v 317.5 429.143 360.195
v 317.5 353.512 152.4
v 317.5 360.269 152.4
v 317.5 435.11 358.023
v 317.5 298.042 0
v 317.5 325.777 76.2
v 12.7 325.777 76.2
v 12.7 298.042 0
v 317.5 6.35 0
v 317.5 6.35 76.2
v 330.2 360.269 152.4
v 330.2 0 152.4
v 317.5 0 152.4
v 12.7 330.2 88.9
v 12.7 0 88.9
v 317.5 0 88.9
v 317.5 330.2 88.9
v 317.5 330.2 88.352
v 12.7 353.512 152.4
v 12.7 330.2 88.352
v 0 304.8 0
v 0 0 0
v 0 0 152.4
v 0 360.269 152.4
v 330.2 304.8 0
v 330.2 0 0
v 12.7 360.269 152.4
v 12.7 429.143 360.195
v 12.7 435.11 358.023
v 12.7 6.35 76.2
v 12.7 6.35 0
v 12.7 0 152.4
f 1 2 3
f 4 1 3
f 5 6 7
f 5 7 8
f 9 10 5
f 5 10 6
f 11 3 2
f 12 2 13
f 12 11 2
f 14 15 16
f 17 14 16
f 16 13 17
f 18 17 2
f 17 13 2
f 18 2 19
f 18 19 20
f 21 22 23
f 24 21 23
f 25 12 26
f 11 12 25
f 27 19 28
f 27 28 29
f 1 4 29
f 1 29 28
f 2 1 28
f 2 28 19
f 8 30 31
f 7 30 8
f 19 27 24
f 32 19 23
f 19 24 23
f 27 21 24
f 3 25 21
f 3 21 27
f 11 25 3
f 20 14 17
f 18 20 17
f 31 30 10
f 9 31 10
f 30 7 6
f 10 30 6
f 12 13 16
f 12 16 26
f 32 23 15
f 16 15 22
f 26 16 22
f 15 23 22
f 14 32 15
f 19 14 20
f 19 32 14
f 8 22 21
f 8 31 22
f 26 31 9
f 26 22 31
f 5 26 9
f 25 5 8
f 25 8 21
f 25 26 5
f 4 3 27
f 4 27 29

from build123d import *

# Parameters (mm, degrees)
F1_DEPTH = 12.7
F3_DEPTH = 152.4
F5_W     = 317.5
F5_H     = 12.7
F6_DEPTH = 330.2
F8_W     = 317.5
F8_H     = 6.35
F9_DEPTH = 76.2


with BuildPart() as f1:
    # F0 (on Right) → F1 (new body)
    with BuildSketch(Plane.YZ):
        Polygon((0, 152.4), (0, 0), (304.8, 0), (360.269064, 152.4), align=None)
    extrude(amount=F1_DEPTH)

    # F2 (on face) → F3 (join)
    with BuildSketch(Plane.YZ.offset(12.7)):
        Polygon((429.142626, 360.194716), (353.511535, 152.4), (360.269064, 152.4), (435.109675, 358.022889), align=None)
        Polygon((353.511535, 152.4), (298.042471, 0), (304.8, 0), (360.269064, 152.4), align=None)
    extrude(amount=F3_DEPTH)

    # F4: F1 across face


with BuildPart() as f1_1:
    add(f1.part)
    add(f1.part.mirror(Plane(origin=(165.1, 366.770487, 179.554949), x_dir=(0, 1, 0), z_dir=(1, 0, 0))))

    # F5 (on Front) → F6 (join)
    with BuildSketch(Plane.XZ):
        with Locations((158.75, 82.55)):
            Rectangle(F5_W, F5_H)
    extrude(amount=-F6_DEPTH)

    # F8 (on face) → F9 (join)
    with BuildSketch(Plane(origin=(0, 0, 76.2), x_dir=(1, 0, 0), z_dir=(0, 0, -1))):
        with Locations((158.75, -3.175)):
            Rectangle(F8_W, F8_H)
    extrude(amount=F9_DEPTH)


solid = f1_1.part
